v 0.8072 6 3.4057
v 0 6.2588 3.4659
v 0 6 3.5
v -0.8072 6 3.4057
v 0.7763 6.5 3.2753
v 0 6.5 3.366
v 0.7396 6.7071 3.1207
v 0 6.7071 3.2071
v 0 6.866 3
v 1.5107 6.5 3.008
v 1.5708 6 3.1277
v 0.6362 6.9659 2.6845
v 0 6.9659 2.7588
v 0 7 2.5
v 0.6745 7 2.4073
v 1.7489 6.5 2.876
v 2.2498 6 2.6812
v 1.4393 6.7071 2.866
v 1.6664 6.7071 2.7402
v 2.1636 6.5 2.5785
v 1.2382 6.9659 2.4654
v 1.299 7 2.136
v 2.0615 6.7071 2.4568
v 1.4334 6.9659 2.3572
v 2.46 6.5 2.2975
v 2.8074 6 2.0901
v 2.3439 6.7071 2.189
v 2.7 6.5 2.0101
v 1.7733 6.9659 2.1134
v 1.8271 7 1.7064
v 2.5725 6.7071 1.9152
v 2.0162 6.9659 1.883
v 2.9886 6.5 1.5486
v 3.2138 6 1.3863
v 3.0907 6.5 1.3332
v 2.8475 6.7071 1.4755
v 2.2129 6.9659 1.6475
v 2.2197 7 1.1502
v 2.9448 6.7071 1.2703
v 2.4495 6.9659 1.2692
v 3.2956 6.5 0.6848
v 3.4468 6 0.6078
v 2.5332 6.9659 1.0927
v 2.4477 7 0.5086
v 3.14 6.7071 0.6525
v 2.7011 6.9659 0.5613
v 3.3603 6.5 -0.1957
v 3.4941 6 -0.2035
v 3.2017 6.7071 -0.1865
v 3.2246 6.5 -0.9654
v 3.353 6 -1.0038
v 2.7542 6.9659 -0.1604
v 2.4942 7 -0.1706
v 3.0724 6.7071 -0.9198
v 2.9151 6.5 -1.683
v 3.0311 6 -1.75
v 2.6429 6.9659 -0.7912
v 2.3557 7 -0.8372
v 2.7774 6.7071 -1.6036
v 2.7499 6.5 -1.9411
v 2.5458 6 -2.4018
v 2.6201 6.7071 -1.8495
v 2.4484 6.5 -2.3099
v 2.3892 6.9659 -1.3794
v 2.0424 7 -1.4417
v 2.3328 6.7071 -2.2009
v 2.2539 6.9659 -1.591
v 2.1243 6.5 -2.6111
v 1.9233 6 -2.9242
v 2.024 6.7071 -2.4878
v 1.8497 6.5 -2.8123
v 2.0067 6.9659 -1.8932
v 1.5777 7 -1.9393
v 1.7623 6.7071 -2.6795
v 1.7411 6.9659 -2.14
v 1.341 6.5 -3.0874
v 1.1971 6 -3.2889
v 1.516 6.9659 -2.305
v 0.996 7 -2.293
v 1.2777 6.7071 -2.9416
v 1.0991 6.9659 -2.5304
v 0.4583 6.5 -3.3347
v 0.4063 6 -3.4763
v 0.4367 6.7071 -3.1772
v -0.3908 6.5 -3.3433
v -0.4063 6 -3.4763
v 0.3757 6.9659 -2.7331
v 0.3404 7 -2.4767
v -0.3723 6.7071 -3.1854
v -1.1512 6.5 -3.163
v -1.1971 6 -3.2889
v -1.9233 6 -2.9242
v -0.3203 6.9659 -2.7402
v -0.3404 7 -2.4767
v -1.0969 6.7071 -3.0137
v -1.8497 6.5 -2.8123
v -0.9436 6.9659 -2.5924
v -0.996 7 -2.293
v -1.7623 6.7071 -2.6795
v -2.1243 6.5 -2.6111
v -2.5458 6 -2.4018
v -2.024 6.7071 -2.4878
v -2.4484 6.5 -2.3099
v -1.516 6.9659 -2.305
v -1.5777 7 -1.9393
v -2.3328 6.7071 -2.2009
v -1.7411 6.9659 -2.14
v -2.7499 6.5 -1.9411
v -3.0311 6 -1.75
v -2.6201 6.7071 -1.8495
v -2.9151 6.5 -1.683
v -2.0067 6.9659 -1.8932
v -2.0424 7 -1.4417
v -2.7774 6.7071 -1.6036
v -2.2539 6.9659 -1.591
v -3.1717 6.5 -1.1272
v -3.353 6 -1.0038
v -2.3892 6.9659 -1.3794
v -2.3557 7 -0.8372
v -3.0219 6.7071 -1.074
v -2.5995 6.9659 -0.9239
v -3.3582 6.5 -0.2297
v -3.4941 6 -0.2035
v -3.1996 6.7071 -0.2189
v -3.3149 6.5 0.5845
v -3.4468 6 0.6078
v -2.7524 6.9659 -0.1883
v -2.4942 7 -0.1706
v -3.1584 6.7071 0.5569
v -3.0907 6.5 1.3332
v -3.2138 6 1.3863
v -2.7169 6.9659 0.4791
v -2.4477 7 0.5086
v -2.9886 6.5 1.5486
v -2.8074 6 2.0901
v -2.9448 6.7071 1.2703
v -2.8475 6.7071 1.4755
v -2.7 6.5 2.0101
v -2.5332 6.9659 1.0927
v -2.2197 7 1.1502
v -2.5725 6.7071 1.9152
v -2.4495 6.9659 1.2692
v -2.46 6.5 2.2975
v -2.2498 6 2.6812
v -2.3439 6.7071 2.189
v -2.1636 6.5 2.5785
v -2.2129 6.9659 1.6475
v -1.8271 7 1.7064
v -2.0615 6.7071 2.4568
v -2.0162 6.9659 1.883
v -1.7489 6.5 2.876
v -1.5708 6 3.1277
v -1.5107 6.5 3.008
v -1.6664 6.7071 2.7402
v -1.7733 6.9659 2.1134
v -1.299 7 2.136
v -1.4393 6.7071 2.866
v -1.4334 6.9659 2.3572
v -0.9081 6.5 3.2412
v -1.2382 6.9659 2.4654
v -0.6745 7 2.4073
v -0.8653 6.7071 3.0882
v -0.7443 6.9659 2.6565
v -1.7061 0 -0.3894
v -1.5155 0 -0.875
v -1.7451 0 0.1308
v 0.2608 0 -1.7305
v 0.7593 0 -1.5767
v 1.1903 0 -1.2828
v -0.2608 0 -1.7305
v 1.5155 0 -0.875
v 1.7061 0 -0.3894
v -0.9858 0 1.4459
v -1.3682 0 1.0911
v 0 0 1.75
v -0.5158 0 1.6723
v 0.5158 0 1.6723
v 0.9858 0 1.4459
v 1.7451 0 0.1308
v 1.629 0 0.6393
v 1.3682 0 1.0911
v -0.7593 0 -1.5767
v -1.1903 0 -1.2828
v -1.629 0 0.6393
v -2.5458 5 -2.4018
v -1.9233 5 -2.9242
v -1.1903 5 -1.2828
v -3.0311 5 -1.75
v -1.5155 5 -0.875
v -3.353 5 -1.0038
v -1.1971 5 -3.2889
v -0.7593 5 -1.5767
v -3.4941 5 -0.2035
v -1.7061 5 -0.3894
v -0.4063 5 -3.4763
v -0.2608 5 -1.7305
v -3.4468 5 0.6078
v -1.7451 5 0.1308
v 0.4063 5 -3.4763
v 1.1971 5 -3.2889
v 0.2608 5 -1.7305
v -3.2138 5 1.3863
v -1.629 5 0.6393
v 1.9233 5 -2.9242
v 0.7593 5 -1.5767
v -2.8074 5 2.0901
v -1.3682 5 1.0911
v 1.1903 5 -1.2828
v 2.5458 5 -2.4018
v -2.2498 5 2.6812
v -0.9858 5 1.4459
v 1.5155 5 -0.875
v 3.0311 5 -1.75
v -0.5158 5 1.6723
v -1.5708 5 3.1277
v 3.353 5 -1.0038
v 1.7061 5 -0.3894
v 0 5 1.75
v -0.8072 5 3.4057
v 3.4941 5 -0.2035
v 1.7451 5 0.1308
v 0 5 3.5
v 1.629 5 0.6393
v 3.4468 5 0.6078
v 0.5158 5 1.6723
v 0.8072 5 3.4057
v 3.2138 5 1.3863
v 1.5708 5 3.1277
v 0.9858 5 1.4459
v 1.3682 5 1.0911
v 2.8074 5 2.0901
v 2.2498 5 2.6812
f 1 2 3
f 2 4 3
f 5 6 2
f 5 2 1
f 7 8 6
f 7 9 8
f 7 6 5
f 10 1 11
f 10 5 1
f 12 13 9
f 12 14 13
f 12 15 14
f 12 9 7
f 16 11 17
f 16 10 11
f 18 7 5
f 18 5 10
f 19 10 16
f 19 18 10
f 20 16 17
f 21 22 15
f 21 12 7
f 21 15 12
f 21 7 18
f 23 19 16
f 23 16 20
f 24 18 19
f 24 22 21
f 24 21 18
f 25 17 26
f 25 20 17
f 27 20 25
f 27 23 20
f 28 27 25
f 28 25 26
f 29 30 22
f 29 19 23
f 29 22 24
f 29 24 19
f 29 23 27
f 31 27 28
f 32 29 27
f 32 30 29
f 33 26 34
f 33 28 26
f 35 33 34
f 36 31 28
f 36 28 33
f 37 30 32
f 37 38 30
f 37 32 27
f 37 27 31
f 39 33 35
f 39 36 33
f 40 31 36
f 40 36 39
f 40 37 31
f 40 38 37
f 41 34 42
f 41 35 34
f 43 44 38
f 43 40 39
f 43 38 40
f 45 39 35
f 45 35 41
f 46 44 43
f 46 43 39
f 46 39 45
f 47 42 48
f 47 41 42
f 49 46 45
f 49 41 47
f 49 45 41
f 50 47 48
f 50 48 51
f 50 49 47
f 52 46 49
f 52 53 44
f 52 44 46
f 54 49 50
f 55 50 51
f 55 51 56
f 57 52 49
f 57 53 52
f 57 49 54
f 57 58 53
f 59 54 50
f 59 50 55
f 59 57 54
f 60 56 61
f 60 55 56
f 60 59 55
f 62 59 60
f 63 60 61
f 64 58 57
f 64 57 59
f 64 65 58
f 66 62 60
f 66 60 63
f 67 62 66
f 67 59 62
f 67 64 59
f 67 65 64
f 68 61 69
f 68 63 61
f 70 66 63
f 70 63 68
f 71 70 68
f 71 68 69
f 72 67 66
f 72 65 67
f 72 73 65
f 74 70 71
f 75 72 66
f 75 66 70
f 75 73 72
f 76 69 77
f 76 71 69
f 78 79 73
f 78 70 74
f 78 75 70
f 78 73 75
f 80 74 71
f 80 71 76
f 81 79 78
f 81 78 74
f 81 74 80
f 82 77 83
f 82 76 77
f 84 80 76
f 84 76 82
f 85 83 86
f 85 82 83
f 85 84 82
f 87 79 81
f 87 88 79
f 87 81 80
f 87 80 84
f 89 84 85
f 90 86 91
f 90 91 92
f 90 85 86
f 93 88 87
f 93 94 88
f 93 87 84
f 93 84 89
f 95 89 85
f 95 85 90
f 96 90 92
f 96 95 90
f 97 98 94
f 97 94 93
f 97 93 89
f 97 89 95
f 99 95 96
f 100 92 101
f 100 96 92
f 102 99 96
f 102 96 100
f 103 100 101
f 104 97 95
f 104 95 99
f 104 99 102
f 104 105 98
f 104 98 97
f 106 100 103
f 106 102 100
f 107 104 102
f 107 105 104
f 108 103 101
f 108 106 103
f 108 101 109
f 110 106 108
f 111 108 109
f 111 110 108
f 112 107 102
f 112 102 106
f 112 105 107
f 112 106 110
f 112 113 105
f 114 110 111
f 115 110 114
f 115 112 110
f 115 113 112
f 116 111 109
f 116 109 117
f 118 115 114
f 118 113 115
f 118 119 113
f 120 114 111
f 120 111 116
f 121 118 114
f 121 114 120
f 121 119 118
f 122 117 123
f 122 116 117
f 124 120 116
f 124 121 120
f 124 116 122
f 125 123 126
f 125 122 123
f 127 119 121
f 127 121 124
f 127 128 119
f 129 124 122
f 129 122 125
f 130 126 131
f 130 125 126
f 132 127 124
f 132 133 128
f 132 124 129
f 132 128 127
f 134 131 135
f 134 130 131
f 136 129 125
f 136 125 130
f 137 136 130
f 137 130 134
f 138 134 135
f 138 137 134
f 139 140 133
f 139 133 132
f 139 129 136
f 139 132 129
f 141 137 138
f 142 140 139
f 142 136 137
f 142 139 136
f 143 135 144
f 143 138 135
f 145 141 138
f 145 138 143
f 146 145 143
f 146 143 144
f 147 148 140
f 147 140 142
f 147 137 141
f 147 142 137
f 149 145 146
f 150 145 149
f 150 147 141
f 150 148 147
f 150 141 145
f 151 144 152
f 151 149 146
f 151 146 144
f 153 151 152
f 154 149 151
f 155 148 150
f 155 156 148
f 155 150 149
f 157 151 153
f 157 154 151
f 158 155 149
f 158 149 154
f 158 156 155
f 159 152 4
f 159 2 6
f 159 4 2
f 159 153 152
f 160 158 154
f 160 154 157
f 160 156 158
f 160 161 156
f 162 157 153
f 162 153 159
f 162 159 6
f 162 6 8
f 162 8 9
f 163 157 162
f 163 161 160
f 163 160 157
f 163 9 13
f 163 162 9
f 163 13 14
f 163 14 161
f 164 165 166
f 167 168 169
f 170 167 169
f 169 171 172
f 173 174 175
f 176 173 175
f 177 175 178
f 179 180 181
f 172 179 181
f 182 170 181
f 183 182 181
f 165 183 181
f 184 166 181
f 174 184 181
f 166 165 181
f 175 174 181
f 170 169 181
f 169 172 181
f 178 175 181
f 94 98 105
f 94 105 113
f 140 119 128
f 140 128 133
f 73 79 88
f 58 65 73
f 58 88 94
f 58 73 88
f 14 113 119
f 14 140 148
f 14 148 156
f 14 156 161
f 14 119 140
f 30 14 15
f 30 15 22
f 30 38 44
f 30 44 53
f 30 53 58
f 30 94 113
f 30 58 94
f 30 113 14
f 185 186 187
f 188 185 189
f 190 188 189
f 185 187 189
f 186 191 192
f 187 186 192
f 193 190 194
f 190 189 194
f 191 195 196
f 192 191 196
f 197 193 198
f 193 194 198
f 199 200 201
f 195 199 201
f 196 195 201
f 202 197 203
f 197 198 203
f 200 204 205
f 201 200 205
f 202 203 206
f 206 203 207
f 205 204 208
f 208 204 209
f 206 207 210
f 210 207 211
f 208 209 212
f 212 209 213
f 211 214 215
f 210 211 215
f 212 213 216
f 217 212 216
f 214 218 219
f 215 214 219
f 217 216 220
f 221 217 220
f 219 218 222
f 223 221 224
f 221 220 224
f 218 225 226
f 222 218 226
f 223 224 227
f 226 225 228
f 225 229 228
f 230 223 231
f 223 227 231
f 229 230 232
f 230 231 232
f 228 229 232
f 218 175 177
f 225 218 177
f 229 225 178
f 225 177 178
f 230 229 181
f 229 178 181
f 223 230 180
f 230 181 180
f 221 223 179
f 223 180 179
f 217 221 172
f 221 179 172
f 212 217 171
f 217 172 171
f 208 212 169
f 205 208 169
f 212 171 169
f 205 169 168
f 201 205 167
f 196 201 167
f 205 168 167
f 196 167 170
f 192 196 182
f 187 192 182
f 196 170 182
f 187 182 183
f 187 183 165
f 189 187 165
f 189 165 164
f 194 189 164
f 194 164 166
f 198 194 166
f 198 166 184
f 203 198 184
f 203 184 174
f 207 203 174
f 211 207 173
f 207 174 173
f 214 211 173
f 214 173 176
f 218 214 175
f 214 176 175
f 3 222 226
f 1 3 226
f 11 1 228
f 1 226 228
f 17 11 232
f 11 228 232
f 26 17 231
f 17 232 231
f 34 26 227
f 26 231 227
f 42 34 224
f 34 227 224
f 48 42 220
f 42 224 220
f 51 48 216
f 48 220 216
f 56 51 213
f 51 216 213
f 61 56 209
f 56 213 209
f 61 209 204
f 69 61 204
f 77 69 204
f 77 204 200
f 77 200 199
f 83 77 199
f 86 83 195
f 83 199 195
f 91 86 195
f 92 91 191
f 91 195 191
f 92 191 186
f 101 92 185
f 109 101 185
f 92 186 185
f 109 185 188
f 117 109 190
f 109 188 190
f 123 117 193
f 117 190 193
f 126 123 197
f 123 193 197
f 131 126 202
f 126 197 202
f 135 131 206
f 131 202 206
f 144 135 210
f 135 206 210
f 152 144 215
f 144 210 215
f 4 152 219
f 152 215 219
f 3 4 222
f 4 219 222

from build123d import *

# Parameters (mm, degrees)
ESQUISSE1_R        = 1.75
BOSS_EXTRU_1_DEPTH = 5
ESQUISSE2_R        = 3.5
BOSS_EXTRU_2_DEPTH = 2
CONG_1_R           = 1


with BuildPart() as part:
    # Esquisse1 → Boss.-Extru.1 (new body)
    with BuildSketch(Plane(origin=(0, 0, 0), x_dir=(1, 0, 0), z_dir=(0, 1, 0))):
        Circle(ESQUISSE1_R)
    extrude(amount=BOSS_EXTRU_1_DEPTH)

    # Esquisse2 → Boss.-Extru.2 (add)
    with BuildSketch(Plane(origin=(0, 5, 0), x_dir=(1, 0, 0), z_dir=(0, 1, 0))):
        Circle(ESQUISSE2_R)
    extrude(amount=BOSS_EXTRU_2_DEPTH)

    # Congé1
    cong_1_edges = [part.edges().sort_by_distance(p)[0] for p in [
        (-3.5, 7, 0),
    ]]
    fillet(cong_1_edges, radius=CONG_1_R)


solid = part.part
